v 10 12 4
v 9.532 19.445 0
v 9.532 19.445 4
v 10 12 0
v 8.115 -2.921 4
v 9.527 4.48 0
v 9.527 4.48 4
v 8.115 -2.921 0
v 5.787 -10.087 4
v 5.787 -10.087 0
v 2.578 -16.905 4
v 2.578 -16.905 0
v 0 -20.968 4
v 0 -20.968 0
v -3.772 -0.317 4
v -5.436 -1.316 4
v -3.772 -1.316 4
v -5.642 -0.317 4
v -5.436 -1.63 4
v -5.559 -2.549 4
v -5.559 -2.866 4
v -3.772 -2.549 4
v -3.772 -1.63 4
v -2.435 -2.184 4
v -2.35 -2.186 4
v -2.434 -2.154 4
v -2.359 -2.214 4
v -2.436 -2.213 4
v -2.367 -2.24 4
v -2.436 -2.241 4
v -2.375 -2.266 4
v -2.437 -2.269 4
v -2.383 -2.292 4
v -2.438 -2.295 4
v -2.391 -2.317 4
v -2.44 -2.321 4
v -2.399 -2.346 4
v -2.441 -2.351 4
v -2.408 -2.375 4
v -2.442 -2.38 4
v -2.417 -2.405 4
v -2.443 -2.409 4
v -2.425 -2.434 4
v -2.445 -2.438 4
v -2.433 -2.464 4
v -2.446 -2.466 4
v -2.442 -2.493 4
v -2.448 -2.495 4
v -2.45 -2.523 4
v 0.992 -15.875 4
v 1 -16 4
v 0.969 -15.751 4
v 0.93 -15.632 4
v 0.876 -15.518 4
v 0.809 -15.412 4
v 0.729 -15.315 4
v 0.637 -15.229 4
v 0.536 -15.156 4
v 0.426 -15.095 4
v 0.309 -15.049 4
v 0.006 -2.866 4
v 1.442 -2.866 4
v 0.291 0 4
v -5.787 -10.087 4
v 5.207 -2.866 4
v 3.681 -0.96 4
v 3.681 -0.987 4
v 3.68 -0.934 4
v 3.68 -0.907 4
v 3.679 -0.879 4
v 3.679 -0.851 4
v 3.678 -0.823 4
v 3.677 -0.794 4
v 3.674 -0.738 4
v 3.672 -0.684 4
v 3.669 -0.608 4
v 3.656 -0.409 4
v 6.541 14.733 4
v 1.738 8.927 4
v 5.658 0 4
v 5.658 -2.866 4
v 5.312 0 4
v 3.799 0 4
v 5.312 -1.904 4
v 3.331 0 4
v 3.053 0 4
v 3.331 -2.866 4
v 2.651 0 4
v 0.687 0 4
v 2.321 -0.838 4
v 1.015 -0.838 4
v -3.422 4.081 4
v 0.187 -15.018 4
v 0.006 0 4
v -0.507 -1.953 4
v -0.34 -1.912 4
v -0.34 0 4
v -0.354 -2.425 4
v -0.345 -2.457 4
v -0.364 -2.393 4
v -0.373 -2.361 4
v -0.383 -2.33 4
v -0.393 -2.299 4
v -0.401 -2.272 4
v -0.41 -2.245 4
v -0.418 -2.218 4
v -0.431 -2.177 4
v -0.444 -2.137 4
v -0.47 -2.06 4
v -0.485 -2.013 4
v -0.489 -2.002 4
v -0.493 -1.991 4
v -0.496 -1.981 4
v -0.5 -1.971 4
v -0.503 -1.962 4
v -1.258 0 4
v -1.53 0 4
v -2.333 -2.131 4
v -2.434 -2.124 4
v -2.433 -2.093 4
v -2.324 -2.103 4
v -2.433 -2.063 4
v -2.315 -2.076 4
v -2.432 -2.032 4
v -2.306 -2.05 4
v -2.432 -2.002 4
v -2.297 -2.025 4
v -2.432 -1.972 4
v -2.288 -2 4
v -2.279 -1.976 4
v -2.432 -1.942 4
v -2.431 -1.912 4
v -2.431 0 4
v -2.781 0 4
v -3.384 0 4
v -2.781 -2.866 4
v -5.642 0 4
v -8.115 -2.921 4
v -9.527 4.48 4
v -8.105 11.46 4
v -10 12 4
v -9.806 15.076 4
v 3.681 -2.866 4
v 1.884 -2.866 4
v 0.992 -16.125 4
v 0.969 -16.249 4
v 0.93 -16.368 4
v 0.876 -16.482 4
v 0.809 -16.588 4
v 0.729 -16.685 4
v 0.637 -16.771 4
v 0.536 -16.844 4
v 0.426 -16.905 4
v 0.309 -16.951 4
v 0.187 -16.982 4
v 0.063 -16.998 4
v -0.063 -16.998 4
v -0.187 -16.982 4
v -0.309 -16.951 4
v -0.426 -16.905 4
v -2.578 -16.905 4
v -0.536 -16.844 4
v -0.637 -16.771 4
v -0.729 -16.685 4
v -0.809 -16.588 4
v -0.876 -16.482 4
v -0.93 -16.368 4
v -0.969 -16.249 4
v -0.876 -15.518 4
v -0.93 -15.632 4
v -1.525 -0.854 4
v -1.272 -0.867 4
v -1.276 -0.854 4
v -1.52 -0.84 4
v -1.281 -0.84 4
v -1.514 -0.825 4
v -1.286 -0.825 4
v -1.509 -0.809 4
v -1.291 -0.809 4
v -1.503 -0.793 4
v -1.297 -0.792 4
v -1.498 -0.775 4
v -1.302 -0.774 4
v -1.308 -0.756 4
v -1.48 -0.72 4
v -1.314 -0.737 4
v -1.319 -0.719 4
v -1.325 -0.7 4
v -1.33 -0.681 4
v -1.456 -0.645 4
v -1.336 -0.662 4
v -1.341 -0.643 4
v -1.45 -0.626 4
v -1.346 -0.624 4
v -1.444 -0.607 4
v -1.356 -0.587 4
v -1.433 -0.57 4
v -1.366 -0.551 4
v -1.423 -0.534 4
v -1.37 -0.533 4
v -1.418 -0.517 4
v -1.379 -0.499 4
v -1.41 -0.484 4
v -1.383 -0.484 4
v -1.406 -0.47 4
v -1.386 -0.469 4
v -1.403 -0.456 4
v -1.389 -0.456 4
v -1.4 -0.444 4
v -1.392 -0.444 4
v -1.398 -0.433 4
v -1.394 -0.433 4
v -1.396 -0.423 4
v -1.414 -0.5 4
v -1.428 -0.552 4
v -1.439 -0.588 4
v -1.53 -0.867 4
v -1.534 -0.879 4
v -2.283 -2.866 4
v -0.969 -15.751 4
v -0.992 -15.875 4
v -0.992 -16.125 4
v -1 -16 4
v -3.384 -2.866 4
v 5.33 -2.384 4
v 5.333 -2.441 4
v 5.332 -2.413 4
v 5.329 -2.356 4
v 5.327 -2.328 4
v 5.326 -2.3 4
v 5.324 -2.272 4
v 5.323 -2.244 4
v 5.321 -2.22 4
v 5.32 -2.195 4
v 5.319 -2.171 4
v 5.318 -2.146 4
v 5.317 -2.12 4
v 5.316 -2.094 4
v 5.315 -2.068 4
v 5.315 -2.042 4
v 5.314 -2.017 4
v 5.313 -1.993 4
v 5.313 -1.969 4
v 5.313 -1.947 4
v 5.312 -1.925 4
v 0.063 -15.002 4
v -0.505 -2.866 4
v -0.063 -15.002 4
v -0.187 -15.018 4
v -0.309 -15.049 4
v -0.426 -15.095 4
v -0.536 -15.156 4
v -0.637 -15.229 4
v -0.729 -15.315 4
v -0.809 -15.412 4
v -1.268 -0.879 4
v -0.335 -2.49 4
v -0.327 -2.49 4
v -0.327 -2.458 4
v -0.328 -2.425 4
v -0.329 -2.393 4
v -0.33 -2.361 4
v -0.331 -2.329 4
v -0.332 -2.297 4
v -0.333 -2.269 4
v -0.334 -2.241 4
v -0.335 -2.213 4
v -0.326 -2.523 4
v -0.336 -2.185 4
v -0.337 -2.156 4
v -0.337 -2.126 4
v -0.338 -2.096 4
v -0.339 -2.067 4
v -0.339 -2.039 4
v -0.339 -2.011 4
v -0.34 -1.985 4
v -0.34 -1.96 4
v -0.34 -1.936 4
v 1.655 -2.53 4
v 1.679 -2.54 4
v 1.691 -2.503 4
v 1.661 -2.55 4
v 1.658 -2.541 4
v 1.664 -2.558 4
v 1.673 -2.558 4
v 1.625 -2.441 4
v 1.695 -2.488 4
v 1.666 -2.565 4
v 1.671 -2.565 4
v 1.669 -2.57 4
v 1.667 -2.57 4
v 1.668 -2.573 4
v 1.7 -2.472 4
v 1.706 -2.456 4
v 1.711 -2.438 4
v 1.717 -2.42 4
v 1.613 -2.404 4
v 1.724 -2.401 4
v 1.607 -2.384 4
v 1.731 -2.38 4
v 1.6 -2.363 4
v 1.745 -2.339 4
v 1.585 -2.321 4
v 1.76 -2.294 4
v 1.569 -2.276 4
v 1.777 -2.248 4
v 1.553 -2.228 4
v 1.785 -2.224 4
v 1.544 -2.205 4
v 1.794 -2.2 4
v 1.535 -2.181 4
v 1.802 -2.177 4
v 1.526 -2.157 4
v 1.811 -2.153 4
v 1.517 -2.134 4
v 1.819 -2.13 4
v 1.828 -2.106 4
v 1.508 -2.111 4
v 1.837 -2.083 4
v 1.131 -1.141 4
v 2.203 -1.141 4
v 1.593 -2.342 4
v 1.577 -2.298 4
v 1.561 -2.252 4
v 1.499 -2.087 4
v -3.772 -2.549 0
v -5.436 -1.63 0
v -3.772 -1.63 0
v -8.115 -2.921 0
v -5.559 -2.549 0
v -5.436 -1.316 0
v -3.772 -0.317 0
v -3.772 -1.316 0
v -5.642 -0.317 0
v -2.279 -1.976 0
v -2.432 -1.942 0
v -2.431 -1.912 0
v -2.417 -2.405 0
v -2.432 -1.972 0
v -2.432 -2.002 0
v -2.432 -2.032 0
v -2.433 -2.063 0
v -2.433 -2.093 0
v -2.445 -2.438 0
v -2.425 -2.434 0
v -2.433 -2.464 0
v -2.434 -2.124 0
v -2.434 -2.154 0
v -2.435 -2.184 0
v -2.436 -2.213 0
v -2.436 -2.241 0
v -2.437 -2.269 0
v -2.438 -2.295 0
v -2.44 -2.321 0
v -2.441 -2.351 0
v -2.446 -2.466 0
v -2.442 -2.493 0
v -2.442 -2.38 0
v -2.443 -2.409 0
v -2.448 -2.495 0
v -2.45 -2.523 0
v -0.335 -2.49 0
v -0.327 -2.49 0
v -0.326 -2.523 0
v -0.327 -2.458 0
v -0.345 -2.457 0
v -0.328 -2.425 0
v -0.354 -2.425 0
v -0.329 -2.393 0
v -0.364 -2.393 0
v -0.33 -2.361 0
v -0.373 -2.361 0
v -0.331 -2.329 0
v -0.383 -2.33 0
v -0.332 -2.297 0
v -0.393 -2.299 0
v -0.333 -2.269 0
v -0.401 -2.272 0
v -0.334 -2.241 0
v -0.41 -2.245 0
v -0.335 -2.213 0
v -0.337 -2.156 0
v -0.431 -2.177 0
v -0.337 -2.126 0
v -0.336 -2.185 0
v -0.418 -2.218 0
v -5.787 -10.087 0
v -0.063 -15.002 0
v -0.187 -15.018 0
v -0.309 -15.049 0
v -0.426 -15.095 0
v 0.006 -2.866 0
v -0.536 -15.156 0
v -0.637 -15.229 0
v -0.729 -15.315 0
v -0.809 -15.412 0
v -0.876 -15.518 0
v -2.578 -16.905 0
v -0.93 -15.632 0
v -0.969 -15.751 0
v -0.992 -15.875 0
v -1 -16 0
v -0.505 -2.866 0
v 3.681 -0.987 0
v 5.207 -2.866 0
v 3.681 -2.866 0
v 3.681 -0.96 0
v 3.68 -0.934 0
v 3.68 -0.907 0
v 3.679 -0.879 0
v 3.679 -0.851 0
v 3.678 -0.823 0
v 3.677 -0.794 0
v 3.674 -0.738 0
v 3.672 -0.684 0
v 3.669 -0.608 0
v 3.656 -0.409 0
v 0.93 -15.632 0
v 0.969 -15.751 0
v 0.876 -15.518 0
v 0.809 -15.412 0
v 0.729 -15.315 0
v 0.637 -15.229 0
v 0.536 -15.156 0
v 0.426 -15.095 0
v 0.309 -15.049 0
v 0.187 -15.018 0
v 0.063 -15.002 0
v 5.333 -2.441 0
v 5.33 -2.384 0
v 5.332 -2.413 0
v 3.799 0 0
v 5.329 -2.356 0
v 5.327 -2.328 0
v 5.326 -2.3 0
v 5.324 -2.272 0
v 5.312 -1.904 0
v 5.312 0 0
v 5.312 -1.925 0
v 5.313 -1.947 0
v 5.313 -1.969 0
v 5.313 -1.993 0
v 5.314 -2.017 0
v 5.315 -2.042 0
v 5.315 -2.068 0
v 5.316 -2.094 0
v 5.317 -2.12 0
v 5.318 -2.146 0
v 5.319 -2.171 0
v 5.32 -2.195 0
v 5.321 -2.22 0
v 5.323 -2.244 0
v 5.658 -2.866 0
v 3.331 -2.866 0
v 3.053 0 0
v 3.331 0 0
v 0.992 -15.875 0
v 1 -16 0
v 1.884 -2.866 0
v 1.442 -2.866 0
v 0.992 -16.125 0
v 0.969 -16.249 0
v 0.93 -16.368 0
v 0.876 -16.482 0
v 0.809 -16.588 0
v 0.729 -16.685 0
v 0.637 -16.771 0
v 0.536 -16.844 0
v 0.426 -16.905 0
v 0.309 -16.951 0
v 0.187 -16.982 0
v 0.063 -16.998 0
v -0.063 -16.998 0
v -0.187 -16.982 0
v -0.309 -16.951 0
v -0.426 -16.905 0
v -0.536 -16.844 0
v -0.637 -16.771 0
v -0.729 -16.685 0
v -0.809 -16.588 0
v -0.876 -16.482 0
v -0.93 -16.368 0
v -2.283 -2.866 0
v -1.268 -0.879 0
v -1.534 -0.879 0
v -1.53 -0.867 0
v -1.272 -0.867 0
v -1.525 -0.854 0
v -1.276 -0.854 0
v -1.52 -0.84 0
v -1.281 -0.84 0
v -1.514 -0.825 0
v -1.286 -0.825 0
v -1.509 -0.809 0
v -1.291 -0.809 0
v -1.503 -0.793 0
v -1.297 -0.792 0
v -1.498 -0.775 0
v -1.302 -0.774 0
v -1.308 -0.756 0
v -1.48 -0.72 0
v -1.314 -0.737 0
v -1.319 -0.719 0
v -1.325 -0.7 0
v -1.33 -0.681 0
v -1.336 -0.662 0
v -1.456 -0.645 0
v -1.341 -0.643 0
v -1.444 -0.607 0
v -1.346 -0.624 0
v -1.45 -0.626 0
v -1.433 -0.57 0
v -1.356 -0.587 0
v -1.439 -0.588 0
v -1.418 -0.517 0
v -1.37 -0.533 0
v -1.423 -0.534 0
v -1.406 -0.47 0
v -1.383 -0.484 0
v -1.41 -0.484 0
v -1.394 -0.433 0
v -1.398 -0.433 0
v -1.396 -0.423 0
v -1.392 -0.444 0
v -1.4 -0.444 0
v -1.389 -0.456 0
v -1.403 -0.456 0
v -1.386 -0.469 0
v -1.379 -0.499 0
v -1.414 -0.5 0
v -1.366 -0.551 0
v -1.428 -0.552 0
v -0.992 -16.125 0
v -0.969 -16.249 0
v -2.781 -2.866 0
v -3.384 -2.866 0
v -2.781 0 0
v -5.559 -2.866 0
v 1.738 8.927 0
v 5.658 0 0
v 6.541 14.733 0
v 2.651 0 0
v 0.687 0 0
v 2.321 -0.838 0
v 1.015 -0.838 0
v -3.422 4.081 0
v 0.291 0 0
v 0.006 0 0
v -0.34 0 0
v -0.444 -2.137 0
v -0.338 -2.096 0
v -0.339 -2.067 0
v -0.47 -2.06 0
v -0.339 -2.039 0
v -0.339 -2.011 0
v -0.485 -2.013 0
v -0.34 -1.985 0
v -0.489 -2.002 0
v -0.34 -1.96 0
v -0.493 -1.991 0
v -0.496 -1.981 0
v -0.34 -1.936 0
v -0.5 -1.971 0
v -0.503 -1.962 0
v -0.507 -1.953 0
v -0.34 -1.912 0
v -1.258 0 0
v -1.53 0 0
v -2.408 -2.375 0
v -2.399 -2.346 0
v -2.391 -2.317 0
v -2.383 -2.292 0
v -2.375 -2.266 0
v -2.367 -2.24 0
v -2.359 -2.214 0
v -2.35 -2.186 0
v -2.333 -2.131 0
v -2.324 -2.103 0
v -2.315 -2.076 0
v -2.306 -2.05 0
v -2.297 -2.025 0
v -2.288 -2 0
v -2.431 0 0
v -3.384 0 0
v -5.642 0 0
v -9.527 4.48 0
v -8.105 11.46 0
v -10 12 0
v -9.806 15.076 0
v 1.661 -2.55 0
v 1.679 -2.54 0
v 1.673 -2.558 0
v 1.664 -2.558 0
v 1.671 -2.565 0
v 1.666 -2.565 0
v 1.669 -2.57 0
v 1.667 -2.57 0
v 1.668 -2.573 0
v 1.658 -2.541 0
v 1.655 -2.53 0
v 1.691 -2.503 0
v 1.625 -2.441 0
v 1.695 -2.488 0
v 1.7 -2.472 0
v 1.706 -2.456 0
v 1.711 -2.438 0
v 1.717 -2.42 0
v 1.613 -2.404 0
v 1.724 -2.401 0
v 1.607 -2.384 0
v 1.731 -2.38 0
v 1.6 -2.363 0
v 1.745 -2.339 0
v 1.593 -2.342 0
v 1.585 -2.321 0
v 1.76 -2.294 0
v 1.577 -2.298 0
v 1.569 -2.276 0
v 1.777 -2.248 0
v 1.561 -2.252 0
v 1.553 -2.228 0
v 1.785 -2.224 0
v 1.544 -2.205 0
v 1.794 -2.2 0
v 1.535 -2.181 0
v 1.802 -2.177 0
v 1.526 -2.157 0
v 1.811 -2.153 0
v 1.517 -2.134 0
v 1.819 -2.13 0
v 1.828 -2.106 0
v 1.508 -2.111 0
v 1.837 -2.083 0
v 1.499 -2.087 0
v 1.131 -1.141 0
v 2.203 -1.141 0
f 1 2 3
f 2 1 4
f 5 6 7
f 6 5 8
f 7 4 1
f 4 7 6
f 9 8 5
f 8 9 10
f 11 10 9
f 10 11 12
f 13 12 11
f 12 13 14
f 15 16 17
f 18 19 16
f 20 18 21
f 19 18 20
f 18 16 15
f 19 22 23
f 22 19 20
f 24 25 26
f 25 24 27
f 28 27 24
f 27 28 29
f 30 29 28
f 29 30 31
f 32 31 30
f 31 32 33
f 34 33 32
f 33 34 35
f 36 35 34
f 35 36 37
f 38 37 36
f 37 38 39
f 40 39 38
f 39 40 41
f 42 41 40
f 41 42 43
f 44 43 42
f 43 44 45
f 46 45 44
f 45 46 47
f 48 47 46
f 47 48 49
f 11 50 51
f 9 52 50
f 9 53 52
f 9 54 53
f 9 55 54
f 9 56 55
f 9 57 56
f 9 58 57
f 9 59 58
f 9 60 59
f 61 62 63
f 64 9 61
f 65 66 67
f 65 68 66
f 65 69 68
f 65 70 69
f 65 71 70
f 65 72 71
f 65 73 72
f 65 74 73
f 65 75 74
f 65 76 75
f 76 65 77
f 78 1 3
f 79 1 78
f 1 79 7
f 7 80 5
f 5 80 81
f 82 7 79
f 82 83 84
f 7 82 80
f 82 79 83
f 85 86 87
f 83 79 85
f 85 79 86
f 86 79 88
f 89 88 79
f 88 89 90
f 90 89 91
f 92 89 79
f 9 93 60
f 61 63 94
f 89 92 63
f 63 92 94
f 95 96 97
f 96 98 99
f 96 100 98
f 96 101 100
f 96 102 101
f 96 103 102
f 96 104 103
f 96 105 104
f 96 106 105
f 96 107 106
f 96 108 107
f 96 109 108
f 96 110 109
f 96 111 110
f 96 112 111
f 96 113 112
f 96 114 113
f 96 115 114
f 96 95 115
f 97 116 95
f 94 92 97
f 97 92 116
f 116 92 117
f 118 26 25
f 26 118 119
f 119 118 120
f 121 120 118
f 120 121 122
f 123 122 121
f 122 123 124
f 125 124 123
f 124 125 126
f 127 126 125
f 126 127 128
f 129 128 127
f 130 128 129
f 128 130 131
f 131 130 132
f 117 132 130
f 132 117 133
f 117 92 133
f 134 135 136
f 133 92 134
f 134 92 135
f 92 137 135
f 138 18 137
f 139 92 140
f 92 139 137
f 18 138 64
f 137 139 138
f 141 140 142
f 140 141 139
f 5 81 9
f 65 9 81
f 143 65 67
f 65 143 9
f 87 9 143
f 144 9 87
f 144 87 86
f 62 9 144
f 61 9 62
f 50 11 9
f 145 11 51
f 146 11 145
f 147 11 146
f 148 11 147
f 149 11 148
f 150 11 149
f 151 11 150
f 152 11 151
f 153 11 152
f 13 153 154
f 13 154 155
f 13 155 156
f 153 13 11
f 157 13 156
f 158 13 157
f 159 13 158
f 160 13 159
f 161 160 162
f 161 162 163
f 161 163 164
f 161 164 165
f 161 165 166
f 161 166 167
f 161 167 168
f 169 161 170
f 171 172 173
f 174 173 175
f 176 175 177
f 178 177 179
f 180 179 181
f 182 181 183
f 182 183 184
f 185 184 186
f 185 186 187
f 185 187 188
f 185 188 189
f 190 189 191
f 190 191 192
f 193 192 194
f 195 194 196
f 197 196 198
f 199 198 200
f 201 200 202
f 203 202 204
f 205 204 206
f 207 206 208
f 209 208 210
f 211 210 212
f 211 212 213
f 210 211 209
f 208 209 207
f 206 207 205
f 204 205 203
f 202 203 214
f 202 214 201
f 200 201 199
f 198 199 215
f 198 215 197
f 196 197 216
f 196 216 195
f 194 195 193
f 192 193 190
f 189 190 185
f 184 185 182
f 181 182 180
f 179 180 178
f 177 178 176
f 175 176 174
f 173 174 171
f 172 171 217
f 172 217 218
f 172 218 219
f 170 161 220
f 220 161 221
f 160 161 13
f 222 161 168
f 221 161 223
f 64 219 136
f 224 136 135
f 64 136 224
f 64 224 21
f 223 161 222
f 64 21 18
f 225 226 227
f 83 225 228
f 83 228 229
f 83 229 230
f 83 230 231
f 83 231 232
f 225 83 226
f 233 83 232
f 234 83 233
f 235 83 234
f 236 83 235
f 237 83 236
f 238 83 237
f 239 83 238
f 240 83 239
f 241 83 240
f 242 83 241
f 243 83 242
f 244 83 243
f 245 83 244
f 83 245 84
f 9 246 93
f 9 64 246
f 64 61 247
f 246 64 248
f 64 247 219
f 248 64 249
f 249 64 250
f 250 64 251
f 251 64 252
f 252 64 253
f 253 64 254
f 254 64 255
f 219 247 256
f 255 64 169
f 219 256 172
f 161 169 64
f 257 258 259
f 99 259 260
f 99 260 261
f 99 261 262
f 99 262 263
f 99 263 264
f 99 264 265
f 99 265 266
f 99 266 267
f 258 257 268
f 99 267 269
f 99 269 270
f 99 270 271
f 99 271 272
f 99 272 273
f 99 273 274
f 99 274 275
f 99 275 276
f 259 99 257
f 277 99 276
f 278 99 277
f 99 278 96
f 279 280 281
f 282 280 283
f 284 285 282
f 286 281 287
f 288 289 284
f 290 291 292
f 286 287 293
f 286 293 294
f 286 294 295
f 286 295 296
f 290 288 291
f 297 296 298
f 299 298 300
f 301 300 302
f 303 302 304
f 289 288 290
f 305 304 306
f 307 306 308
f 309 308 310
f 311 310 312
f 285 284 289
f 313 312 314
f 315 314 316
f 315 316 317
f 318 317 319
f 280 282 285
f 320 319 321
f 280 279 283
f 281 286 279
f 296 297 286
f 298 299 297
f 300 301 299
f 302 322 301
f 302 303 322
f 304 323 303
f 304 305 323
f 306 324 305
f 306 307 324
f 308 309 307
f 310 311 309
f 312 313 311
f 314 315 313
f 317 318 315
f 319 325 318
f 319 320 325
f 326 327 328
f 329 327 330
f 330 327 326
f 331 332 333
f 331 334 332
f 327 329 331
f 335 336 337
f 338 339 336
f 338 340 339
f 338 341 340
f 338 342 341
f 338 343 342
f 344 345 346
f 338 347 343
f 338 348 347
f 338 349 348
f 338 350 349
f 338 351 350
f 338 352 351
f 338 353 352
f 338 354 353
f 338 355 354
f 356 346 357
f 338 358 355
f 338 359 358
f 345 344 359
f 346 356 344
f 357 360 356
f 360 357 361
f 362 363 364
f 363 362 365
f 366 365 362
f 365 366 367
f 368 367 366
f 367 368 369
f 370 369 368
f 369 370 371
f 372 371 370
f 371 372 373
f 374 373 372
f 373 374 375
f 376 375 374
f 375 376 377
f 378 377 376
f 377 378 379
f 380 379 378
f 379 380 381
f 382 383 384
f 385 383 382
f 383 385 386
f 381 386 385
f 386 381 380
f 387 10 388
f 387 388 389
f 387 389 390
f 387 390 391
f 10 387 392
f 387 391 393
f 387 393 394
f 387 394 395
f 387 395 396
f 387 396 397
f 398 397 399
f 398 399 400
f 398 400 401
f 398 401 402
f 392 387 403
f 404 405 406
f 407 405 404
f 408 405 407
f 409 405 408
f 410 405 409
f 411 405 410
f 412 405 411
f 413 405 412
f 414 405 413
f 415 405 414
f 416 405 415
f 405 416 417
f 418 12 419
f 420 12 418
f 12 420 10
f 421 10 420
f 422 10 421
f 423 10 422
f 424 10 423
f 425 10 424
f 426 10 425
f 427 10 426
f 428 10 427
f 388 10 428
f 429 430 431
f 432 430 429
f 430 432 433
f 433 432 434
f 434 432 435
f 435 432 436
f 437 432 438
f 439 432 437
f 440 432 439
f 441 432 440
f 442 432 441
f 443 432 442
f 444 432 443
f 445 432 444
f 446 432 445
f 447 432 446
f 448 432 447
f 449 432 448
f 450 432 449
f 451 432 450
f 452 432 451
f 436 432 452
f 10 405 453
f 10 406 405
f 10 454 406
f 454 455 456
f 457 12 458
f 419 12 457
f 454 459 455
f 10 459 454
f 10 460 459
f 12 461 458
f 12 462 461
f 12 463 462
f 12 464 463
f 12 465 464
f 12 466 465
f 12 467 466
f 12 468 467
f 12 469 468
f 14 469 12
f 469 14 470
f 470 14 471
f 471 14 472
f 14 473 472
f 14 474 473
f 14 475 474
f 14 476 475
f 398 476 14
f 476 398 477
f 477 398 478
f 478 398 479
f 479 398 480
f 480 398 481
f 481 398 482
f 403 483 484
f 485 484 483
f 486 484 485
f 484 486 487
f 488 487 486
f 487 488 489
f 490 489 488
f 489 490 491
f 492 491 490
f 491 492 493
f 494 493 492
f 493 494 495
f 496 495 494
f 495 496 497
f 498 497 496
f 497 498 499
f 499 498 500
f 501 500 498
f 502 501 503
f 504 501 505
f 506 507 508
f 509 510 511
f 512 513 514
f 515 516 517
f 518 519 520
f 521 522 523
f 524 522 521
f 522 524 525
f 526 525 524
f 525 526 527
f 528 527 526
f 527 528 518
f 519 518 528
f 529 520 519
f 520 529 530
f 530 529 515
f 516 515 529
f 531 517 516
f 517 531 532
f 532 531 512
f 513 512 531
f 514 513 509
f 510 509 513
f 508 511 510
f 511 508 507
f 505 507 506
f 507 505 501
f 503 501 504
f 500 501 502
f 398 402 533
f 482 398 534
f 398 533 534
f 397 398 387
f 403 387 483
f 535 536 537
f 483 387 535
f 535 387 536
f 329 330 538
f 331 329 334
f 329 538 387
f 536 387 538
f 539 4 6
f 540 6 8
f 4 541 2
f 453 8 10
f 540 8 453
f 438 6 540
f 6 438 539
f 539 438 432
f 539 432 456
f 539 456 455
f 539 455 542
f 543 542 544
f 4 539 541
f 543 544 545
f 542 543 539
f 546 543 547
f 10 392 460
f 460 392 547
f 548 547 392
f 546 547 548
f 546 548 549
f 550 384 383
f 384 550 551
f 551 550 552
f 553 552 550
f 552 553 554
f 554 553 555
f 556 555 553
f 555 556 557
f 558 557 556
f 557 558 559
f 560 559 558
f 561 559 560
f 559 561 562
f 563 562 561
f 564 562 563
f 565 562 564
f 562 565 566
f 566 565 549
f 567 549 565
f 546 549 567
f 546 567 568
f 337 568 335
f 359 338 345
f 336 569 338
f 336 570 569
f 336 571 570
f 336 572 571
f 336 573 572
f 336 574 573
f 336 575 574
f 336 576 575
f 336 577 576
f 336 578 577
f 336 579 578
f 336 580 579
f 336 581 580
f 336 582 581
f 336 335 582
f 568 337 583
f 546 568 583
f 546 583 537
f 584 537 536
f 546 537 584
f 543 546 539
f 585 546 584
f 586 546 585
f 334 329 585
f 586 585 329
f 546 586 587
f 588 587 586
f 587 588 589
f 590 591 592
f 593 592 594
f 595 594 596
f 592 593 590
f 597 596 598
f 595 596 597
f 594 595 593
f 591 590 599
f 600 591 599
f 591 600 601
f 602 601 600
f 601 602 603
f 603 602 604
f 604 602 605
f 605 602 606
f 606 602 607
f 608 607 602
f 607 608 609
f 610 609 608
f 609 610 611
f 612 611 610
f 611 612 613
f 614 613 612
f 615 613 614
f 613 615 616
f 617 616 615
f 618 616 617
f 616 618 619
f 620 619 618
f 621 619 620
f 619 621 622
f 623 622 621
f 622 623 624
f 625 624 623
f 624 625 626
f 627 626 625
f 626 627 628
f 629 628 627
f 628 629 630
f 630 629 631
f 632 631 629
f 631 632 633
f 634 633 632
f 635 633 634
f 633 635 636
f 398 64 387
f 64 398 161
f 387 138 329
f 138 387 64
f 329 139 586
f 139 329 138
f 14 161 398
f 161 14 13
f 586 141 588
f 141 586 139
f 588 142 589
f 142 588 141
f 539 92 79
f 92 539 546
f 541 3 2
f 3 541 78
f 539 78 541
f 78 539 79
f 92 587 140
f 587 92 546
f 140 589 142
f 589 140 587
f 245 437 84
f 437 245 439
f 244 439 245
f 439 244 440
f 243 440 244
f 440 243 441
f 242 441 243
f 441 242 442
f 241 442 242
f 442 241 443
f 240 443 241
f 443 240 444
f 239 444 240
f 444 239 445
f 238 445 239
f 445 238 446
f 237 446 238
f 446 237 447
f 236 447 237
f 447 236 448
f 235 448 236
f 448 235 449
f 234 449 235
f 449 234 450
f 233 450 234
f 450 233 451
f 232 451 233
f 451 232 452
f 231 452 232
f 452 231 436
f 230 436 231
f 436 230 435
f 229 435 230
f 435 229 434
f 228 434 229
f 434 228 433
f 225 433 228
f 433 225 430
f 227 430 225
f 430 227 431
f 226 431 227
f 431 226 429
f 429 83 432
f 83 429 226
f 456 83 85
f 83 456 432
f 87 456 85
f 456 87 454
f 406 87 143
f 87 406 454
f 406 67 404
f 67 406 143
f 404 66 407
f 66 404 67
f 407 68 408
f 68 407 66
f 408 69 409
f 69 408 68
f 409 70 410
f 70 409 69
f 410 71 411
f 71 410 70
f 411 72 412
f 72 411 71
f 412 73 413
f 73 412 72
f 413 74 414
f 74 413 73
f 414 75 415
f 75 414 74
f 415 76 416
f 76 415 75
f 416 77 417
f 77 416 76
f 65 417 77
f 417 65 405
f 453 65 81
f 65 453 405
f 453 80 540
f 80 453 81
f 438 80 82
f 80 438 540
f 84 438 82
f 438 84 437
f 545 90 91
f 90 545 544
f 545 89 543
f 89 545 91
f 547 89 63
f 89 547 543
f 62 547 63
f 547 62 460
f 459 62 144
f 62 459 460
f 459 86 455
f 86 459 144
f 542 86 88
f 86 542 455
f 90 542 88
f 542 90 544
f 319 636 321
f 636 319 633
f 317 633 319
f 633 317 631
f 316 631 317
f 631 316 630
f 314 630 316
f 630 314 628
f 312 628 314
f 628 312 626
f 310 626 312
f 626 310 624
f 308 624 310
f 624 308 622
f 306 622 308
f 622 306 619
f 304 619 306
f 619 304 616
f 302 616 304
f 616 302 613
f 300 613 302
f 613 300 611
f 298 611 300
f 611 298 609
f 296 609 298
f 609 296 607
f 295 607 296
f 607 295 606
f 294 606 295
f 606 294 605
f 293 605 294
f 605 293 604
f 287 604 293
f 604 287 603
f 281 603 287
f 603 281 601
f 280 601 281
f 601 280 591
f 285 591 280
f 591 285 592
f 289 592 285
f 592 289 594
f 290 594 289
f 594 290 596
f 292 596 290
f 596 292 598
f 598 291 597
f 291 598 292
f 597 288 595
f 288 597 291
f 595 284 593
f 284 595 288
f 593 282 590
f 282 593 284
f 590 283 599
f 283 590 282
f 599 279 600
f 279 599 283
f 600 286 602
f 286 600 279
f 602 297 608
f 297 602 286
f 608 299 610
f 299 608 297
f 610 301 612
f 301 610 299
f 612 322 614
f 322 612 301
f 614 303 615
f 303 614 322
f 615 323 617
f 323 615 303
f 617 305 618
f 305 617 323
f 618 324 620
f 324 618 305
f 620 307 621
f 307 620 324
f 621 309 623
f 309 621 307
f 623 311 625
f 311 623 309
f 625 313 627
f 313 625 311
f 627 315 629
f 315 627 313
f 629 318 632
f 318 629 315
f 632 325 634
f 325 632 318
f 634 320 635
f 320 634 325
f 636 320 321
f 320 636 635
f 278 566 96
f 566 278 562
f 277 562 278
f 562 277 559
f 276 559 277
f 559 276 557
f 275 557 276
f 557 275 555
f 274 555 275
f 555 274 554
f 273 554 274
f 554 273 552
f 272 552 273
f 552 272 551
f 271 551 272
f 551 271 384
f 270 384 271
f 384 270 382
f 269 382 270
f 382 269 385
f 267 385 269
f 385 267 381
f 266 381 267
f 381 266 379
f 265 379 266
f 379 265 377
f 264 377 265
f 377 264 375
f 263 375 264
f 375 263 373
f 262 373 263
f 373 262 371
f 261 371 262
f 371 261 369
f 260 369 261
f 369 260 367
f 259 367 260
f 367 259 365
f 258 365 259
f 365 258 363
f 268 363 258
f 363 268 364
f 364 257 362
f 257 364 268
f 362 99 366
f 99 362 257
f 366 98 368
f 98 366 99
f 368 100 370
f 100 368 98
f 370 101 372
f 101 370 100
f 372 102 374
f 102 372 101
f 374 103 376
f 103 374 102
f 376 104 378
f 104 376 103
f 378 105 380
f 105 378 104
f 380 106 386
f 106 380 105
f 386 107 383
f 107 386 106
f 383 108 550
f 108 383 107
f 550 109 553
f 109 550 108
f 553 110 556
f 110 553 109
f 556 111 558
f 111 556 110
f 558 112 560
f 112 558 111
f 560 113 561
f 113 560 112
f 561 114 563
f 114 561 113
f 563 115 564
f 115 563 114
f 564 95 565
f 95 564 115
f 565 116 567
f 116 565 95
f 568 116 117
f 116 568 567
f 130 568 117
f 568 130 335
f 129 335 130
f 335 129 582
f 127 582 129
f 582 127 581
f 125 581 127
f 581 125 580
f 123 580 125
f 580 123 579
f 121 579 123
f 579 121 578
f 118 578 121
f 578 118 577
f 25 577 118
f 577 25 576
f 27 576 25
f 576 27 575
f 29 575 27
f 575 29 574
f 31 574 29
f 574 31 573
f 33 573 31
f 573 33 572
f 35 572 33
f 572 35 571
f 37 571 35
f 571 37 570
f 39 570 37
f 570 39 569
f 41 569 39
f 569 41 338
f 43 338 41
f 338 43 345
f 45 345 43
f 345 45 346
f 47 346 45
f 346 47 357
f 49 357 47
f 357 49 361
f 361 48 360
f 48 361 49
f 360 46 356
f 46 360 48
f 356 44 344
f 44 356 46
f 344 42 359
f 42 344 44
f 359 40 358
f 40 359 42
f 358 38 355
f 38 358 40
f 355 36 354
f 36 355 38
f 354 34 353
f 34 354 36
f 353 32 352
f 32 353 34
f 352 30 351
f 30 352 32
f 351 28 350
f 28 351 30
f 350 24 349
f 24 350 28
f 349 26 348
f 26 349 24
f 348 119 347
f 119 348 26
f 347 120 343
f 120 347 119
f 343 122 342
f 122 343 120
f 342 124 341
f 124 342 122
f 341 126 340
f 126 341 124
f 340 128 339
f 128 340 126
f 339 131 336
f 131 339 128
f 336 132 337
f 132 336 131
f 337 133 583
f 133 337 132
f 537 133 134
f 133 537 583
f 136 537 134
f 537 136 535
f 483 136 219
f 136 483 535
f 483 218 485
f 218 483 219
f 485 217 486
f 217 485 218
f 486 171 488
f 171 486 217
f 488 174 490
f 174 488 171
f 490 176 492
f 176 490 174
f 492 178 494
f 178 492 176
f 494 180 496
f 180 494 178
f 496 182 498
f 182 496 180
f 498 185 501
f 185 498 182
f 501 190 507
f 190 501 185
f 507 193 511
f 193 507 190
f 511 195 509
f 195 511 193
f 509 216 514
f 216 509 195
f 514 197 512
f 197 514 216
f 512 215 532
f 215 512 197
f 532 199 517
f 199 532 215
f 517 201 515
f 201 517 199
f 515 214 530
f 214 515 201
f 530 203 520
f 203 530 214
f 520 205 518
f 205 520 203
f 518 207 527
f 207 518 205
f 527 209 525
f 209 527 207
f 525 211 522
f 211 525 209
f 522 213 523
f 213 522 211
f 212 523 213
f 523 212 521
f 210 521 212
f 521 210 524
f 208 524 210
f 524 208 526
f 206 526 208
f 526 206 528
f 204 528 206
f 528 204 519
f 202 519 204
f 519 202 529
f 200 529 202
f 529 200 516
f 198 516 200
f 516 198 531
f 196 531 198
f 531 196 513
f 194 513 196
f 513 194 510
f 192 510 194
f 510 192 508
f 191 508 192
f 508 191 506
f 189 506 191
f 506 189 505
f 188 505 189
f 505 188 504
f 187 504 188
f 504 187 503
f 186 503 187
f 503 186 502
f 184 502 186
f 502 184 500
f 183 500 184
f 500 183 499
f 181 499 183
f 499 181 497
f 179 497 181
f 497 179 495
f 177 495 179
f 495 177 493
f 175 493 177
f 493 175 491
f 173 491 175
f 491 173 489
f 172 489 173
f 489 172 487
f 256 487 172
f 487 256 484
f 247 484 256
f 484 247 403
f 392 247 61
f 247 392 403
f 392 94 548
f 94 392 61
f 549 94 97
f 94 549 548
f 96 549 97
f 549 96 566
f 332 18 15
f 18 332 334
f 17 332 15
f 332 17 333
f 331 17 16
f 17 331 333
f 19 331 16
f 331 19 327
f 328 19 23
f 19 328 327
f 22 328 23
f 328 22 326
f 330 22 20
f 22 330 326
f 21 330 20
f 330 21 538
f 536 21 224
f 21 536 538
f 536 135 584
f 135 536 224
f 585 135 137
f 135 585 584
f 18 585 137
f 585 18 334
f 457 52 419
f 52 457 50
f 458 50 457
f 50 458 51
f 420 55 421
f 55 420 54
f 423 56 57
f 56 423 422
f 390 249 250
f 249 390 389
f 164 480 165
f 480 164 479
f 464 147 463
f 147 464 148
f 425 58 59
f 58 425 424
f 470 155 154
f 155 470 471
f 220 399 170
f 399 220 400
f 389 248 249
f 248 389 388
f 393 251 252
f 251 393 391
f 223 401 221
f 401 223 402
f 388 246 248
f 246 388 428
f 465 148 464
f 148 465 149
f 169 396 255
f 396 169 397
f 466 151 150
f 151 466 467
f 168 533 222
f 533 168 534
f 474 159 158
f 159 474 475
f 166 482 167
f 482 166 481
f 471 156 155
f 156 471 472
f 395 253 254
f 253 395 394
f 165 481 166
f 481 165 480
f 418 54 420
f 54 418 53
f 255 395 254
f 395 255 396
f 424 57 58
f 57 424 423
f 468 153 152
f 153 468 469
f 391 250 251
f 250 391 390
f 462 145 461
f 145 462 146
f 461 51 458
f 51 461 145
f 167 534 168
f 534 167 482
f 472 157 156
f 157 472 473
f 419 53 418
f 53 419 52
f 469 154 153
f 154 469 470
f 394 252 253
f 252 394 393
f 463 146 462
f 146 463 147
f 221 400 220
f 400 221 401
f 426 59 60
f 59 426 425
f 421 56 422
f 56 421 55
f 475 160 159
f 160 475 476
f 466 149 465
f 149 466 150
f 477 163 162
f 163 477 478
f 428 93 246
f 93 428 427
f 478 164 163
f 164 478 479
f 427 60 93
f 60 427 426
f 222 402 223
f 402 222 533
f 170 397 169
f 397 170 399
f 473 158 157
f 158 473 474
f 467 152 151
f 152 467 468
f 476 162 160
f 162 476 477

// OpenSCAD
$fn = 50;

name = "NAME";


module leaf1(scale){
    intersection() {
        translate([-25 * scale, 6 * scale, 0 * scale]) cylinder(h=4, r=30 * scale, center=false);
        translate([25 * scale, 6 * scale, 0 * scale]) cylinder(h=4, r=30 * scale, center=false);
    }    
}

module leaf2(scale){
    intersection() {
        translate([-17 * scale, 3 * scale, 0 * scale]) cylinder(h=4, r=30 * scale, center=false);
        translate([35 * scale, 3 * scale, 0 * scale]) cylinder(h=4, r=40 * scale, center=false);
    }    
}

module insignia_top(scale) {
    difference() {
        difference() {
            leaf1(scale);
            translate([-4 * scale, 22 * scale, 0 * scale]) { rotate(a=0, v=[0,0, 1]) leaf2(scale);};
            };
            
        linear_extrude(height=4, center=false) {       
            translate([3 * scale, 0 * scale, 0 * scale]) {rotate(a=180, v=[0, 0, 1]) text(text=name, size=1.5 * scale);};
        };
    }
}

// The union of the inner part and a circular base, minus a hole
module starfleet_insignia(scale) {
    difference() {
        insignia_top(scale);
        
        translate([0, -8 * scale, 0]) cylinder(h=4, r=1.0, center=false);
    }
}

starfleet_insignia(2);
